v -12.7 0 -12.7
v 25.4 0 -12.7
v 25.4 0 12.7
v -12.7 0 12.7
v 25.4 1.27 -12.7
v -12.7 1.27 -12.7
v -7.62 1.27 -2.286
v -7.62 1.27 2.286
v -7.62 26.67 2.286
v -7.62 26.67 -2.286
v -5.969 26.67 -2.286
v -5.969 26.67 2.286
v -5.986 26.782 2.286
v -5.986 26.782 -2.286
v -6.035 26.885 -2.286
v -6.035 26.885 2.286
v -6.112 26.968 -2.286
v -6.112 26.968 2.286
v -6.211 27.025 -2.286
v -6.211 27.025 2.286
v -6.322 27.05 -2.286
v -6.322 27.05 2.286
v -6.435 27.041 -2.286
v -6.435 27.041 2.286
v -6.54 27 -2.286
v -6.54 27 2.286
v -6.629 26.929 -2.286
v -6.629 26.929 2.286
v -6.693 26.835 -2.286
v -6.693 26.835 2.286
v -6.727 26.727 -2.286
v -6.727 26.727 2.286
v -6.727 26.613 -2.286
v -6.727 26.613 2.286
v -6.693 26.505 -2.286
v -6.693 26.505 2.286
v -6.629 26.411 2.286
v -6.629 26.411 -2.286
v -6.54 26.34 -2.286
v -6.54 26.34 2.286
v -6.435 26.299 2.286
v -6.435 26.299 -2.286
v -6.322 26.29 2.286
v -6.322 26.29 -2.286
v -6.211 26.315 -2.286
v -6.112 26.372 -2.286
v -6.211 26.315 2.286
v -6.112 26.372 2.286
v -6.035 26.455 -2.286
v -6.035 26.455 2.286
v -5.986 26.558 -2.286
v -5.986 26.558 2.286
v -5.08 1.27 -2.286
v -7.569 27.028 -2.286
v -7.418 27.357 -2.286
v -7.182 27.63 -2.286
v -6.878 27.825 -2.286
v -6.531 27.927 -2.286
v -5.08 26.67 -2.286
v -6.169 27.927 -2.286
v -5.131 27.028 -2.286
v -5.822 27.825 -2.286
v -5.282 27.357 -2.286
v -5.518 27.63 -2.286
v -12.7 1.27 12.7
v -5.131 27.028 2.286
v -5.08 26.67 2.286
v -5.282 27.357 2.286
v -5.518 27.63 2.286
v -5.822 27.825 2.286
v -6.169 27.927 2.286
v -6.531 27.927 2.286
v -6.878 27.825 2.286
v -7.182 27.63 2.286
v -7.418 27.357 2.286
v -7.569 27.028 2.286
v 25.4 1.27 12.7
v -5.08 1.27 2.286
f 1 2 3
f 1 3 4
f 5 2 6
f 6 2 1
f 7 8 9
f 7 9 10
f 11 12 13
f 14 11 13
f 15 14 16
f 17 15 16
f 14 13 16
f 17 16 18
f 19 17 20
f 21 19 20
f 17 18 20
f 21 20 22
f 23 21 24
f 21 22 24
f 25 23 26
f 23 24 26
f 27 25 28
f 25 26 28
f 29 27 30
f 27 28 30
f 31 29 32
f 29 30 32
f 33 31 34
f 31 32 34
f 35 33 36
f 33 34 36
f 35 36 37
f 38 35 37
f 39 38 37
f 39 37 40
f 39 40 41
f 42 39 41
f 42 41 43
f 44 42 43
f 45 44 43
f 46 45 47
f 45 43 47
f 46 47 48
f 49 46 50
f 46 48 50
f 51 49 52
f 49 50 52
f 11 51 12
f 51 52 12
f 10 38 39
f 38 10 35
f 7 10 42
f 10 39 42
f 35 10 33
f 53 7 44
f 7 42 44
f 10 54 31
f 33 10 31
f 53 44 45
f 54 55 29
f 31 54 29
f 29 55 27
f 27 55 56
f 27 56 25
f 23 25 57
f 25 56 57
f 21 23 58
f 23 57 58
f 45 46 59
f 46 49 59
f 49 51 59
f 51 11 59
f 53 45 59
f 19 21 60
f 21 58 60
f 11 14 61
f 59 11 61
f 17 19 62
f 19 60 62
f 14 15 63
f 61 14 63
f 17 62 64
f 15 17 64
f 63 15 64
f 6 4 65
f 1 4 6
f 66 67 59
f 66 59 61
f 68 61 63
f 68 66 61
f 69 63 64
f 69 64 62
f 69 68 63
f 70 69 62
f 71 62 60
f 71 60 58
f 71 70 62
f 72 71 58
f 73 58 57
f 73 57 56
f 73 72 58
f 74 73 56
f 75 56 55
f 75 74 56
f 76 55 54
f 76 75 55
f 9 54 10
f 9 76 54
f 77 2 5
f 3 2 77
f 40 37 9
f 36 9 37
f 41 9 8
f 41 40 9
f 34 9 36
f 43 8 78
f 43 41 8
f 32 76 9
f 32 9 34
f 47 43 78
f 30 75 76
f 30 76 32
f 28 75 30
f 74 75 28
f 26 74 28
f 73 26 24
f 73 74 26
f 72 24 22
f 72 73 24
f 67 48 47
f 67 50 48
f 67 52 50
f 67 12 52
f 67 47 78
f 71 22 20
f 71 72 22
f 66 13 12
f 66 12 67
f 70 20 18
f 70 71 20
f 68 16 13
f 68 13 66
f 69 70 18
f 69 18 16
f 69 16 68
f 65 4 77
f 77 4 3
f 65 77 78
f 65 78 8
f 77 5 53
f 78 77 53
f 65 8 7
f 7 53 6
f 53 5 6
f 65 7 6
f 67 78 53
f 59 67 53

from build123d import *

# Parameters (mm, degrees)
BOSS_EXTRUDE1_DEPTH = 1.27
SKETCH2_W           = 2.54
SKETCH2_H           = 4.572
BOSS_EXTRUDE2_DEPTH = 25.4
SKETCH3_R           = 1.27
BOSS_EXTRUDE3_DEPTH = 4.572
SKETCH4_R           = 0.381
CUT_EXTRUDE1_DEPTH  = 4.572


with BuildPart() as part:
    # Sketch1 → Boss-Extrude1 (new body)
    with BuildSketch(Plane(origin=(0, 0, 0), x_dir=(1, 0, 0), z_dir=(0, 1, 0))):
        Polygon((-12.7, 12.7), (12.7, 12.7), (25.4, 12.7), (25.4, -12.7), (12.7, -12.7), (-12.7, -12.7), align=None)
    extrude(amount=BOSS_EXTRUDE1_DEPTH)

    # Sketch2 → Boss-Extrude2 (add)
    with BuildSketch(Plane(origin=(0, 1.27, 0), x_dir=(1, 0, 0), z_dir=(0, 1, 0))):
        with Locations((-6.35, 0)):
            Rectangle(SKETCH2_W, SKETCH2_H)
    extrude(amount=BOSS_EXTRUDE2_DEPTH)

    # Sketch3 → Boss-Extrude3 (add)
    with BuildSketch(Plane.XY.offset(2.286)):
        with Locations((-6.35, 26.67)):
            Circle(SKETCH3_R)
    extrude(amount=-BOSS_EXTRUDE3_DEPTH)

    # Sketch4 → Cut-Extrude1 (cut)
    with BuildSketch(Plane.XY.offset(2.286)):
        with Locations((-6.35, 26.67)):
            Circle(SKETCH4_R)
    extrude(amount=-CUT_EXTRUDE1_DEPTH, mode=Mode.SUBTRACT)


solid = part.part
